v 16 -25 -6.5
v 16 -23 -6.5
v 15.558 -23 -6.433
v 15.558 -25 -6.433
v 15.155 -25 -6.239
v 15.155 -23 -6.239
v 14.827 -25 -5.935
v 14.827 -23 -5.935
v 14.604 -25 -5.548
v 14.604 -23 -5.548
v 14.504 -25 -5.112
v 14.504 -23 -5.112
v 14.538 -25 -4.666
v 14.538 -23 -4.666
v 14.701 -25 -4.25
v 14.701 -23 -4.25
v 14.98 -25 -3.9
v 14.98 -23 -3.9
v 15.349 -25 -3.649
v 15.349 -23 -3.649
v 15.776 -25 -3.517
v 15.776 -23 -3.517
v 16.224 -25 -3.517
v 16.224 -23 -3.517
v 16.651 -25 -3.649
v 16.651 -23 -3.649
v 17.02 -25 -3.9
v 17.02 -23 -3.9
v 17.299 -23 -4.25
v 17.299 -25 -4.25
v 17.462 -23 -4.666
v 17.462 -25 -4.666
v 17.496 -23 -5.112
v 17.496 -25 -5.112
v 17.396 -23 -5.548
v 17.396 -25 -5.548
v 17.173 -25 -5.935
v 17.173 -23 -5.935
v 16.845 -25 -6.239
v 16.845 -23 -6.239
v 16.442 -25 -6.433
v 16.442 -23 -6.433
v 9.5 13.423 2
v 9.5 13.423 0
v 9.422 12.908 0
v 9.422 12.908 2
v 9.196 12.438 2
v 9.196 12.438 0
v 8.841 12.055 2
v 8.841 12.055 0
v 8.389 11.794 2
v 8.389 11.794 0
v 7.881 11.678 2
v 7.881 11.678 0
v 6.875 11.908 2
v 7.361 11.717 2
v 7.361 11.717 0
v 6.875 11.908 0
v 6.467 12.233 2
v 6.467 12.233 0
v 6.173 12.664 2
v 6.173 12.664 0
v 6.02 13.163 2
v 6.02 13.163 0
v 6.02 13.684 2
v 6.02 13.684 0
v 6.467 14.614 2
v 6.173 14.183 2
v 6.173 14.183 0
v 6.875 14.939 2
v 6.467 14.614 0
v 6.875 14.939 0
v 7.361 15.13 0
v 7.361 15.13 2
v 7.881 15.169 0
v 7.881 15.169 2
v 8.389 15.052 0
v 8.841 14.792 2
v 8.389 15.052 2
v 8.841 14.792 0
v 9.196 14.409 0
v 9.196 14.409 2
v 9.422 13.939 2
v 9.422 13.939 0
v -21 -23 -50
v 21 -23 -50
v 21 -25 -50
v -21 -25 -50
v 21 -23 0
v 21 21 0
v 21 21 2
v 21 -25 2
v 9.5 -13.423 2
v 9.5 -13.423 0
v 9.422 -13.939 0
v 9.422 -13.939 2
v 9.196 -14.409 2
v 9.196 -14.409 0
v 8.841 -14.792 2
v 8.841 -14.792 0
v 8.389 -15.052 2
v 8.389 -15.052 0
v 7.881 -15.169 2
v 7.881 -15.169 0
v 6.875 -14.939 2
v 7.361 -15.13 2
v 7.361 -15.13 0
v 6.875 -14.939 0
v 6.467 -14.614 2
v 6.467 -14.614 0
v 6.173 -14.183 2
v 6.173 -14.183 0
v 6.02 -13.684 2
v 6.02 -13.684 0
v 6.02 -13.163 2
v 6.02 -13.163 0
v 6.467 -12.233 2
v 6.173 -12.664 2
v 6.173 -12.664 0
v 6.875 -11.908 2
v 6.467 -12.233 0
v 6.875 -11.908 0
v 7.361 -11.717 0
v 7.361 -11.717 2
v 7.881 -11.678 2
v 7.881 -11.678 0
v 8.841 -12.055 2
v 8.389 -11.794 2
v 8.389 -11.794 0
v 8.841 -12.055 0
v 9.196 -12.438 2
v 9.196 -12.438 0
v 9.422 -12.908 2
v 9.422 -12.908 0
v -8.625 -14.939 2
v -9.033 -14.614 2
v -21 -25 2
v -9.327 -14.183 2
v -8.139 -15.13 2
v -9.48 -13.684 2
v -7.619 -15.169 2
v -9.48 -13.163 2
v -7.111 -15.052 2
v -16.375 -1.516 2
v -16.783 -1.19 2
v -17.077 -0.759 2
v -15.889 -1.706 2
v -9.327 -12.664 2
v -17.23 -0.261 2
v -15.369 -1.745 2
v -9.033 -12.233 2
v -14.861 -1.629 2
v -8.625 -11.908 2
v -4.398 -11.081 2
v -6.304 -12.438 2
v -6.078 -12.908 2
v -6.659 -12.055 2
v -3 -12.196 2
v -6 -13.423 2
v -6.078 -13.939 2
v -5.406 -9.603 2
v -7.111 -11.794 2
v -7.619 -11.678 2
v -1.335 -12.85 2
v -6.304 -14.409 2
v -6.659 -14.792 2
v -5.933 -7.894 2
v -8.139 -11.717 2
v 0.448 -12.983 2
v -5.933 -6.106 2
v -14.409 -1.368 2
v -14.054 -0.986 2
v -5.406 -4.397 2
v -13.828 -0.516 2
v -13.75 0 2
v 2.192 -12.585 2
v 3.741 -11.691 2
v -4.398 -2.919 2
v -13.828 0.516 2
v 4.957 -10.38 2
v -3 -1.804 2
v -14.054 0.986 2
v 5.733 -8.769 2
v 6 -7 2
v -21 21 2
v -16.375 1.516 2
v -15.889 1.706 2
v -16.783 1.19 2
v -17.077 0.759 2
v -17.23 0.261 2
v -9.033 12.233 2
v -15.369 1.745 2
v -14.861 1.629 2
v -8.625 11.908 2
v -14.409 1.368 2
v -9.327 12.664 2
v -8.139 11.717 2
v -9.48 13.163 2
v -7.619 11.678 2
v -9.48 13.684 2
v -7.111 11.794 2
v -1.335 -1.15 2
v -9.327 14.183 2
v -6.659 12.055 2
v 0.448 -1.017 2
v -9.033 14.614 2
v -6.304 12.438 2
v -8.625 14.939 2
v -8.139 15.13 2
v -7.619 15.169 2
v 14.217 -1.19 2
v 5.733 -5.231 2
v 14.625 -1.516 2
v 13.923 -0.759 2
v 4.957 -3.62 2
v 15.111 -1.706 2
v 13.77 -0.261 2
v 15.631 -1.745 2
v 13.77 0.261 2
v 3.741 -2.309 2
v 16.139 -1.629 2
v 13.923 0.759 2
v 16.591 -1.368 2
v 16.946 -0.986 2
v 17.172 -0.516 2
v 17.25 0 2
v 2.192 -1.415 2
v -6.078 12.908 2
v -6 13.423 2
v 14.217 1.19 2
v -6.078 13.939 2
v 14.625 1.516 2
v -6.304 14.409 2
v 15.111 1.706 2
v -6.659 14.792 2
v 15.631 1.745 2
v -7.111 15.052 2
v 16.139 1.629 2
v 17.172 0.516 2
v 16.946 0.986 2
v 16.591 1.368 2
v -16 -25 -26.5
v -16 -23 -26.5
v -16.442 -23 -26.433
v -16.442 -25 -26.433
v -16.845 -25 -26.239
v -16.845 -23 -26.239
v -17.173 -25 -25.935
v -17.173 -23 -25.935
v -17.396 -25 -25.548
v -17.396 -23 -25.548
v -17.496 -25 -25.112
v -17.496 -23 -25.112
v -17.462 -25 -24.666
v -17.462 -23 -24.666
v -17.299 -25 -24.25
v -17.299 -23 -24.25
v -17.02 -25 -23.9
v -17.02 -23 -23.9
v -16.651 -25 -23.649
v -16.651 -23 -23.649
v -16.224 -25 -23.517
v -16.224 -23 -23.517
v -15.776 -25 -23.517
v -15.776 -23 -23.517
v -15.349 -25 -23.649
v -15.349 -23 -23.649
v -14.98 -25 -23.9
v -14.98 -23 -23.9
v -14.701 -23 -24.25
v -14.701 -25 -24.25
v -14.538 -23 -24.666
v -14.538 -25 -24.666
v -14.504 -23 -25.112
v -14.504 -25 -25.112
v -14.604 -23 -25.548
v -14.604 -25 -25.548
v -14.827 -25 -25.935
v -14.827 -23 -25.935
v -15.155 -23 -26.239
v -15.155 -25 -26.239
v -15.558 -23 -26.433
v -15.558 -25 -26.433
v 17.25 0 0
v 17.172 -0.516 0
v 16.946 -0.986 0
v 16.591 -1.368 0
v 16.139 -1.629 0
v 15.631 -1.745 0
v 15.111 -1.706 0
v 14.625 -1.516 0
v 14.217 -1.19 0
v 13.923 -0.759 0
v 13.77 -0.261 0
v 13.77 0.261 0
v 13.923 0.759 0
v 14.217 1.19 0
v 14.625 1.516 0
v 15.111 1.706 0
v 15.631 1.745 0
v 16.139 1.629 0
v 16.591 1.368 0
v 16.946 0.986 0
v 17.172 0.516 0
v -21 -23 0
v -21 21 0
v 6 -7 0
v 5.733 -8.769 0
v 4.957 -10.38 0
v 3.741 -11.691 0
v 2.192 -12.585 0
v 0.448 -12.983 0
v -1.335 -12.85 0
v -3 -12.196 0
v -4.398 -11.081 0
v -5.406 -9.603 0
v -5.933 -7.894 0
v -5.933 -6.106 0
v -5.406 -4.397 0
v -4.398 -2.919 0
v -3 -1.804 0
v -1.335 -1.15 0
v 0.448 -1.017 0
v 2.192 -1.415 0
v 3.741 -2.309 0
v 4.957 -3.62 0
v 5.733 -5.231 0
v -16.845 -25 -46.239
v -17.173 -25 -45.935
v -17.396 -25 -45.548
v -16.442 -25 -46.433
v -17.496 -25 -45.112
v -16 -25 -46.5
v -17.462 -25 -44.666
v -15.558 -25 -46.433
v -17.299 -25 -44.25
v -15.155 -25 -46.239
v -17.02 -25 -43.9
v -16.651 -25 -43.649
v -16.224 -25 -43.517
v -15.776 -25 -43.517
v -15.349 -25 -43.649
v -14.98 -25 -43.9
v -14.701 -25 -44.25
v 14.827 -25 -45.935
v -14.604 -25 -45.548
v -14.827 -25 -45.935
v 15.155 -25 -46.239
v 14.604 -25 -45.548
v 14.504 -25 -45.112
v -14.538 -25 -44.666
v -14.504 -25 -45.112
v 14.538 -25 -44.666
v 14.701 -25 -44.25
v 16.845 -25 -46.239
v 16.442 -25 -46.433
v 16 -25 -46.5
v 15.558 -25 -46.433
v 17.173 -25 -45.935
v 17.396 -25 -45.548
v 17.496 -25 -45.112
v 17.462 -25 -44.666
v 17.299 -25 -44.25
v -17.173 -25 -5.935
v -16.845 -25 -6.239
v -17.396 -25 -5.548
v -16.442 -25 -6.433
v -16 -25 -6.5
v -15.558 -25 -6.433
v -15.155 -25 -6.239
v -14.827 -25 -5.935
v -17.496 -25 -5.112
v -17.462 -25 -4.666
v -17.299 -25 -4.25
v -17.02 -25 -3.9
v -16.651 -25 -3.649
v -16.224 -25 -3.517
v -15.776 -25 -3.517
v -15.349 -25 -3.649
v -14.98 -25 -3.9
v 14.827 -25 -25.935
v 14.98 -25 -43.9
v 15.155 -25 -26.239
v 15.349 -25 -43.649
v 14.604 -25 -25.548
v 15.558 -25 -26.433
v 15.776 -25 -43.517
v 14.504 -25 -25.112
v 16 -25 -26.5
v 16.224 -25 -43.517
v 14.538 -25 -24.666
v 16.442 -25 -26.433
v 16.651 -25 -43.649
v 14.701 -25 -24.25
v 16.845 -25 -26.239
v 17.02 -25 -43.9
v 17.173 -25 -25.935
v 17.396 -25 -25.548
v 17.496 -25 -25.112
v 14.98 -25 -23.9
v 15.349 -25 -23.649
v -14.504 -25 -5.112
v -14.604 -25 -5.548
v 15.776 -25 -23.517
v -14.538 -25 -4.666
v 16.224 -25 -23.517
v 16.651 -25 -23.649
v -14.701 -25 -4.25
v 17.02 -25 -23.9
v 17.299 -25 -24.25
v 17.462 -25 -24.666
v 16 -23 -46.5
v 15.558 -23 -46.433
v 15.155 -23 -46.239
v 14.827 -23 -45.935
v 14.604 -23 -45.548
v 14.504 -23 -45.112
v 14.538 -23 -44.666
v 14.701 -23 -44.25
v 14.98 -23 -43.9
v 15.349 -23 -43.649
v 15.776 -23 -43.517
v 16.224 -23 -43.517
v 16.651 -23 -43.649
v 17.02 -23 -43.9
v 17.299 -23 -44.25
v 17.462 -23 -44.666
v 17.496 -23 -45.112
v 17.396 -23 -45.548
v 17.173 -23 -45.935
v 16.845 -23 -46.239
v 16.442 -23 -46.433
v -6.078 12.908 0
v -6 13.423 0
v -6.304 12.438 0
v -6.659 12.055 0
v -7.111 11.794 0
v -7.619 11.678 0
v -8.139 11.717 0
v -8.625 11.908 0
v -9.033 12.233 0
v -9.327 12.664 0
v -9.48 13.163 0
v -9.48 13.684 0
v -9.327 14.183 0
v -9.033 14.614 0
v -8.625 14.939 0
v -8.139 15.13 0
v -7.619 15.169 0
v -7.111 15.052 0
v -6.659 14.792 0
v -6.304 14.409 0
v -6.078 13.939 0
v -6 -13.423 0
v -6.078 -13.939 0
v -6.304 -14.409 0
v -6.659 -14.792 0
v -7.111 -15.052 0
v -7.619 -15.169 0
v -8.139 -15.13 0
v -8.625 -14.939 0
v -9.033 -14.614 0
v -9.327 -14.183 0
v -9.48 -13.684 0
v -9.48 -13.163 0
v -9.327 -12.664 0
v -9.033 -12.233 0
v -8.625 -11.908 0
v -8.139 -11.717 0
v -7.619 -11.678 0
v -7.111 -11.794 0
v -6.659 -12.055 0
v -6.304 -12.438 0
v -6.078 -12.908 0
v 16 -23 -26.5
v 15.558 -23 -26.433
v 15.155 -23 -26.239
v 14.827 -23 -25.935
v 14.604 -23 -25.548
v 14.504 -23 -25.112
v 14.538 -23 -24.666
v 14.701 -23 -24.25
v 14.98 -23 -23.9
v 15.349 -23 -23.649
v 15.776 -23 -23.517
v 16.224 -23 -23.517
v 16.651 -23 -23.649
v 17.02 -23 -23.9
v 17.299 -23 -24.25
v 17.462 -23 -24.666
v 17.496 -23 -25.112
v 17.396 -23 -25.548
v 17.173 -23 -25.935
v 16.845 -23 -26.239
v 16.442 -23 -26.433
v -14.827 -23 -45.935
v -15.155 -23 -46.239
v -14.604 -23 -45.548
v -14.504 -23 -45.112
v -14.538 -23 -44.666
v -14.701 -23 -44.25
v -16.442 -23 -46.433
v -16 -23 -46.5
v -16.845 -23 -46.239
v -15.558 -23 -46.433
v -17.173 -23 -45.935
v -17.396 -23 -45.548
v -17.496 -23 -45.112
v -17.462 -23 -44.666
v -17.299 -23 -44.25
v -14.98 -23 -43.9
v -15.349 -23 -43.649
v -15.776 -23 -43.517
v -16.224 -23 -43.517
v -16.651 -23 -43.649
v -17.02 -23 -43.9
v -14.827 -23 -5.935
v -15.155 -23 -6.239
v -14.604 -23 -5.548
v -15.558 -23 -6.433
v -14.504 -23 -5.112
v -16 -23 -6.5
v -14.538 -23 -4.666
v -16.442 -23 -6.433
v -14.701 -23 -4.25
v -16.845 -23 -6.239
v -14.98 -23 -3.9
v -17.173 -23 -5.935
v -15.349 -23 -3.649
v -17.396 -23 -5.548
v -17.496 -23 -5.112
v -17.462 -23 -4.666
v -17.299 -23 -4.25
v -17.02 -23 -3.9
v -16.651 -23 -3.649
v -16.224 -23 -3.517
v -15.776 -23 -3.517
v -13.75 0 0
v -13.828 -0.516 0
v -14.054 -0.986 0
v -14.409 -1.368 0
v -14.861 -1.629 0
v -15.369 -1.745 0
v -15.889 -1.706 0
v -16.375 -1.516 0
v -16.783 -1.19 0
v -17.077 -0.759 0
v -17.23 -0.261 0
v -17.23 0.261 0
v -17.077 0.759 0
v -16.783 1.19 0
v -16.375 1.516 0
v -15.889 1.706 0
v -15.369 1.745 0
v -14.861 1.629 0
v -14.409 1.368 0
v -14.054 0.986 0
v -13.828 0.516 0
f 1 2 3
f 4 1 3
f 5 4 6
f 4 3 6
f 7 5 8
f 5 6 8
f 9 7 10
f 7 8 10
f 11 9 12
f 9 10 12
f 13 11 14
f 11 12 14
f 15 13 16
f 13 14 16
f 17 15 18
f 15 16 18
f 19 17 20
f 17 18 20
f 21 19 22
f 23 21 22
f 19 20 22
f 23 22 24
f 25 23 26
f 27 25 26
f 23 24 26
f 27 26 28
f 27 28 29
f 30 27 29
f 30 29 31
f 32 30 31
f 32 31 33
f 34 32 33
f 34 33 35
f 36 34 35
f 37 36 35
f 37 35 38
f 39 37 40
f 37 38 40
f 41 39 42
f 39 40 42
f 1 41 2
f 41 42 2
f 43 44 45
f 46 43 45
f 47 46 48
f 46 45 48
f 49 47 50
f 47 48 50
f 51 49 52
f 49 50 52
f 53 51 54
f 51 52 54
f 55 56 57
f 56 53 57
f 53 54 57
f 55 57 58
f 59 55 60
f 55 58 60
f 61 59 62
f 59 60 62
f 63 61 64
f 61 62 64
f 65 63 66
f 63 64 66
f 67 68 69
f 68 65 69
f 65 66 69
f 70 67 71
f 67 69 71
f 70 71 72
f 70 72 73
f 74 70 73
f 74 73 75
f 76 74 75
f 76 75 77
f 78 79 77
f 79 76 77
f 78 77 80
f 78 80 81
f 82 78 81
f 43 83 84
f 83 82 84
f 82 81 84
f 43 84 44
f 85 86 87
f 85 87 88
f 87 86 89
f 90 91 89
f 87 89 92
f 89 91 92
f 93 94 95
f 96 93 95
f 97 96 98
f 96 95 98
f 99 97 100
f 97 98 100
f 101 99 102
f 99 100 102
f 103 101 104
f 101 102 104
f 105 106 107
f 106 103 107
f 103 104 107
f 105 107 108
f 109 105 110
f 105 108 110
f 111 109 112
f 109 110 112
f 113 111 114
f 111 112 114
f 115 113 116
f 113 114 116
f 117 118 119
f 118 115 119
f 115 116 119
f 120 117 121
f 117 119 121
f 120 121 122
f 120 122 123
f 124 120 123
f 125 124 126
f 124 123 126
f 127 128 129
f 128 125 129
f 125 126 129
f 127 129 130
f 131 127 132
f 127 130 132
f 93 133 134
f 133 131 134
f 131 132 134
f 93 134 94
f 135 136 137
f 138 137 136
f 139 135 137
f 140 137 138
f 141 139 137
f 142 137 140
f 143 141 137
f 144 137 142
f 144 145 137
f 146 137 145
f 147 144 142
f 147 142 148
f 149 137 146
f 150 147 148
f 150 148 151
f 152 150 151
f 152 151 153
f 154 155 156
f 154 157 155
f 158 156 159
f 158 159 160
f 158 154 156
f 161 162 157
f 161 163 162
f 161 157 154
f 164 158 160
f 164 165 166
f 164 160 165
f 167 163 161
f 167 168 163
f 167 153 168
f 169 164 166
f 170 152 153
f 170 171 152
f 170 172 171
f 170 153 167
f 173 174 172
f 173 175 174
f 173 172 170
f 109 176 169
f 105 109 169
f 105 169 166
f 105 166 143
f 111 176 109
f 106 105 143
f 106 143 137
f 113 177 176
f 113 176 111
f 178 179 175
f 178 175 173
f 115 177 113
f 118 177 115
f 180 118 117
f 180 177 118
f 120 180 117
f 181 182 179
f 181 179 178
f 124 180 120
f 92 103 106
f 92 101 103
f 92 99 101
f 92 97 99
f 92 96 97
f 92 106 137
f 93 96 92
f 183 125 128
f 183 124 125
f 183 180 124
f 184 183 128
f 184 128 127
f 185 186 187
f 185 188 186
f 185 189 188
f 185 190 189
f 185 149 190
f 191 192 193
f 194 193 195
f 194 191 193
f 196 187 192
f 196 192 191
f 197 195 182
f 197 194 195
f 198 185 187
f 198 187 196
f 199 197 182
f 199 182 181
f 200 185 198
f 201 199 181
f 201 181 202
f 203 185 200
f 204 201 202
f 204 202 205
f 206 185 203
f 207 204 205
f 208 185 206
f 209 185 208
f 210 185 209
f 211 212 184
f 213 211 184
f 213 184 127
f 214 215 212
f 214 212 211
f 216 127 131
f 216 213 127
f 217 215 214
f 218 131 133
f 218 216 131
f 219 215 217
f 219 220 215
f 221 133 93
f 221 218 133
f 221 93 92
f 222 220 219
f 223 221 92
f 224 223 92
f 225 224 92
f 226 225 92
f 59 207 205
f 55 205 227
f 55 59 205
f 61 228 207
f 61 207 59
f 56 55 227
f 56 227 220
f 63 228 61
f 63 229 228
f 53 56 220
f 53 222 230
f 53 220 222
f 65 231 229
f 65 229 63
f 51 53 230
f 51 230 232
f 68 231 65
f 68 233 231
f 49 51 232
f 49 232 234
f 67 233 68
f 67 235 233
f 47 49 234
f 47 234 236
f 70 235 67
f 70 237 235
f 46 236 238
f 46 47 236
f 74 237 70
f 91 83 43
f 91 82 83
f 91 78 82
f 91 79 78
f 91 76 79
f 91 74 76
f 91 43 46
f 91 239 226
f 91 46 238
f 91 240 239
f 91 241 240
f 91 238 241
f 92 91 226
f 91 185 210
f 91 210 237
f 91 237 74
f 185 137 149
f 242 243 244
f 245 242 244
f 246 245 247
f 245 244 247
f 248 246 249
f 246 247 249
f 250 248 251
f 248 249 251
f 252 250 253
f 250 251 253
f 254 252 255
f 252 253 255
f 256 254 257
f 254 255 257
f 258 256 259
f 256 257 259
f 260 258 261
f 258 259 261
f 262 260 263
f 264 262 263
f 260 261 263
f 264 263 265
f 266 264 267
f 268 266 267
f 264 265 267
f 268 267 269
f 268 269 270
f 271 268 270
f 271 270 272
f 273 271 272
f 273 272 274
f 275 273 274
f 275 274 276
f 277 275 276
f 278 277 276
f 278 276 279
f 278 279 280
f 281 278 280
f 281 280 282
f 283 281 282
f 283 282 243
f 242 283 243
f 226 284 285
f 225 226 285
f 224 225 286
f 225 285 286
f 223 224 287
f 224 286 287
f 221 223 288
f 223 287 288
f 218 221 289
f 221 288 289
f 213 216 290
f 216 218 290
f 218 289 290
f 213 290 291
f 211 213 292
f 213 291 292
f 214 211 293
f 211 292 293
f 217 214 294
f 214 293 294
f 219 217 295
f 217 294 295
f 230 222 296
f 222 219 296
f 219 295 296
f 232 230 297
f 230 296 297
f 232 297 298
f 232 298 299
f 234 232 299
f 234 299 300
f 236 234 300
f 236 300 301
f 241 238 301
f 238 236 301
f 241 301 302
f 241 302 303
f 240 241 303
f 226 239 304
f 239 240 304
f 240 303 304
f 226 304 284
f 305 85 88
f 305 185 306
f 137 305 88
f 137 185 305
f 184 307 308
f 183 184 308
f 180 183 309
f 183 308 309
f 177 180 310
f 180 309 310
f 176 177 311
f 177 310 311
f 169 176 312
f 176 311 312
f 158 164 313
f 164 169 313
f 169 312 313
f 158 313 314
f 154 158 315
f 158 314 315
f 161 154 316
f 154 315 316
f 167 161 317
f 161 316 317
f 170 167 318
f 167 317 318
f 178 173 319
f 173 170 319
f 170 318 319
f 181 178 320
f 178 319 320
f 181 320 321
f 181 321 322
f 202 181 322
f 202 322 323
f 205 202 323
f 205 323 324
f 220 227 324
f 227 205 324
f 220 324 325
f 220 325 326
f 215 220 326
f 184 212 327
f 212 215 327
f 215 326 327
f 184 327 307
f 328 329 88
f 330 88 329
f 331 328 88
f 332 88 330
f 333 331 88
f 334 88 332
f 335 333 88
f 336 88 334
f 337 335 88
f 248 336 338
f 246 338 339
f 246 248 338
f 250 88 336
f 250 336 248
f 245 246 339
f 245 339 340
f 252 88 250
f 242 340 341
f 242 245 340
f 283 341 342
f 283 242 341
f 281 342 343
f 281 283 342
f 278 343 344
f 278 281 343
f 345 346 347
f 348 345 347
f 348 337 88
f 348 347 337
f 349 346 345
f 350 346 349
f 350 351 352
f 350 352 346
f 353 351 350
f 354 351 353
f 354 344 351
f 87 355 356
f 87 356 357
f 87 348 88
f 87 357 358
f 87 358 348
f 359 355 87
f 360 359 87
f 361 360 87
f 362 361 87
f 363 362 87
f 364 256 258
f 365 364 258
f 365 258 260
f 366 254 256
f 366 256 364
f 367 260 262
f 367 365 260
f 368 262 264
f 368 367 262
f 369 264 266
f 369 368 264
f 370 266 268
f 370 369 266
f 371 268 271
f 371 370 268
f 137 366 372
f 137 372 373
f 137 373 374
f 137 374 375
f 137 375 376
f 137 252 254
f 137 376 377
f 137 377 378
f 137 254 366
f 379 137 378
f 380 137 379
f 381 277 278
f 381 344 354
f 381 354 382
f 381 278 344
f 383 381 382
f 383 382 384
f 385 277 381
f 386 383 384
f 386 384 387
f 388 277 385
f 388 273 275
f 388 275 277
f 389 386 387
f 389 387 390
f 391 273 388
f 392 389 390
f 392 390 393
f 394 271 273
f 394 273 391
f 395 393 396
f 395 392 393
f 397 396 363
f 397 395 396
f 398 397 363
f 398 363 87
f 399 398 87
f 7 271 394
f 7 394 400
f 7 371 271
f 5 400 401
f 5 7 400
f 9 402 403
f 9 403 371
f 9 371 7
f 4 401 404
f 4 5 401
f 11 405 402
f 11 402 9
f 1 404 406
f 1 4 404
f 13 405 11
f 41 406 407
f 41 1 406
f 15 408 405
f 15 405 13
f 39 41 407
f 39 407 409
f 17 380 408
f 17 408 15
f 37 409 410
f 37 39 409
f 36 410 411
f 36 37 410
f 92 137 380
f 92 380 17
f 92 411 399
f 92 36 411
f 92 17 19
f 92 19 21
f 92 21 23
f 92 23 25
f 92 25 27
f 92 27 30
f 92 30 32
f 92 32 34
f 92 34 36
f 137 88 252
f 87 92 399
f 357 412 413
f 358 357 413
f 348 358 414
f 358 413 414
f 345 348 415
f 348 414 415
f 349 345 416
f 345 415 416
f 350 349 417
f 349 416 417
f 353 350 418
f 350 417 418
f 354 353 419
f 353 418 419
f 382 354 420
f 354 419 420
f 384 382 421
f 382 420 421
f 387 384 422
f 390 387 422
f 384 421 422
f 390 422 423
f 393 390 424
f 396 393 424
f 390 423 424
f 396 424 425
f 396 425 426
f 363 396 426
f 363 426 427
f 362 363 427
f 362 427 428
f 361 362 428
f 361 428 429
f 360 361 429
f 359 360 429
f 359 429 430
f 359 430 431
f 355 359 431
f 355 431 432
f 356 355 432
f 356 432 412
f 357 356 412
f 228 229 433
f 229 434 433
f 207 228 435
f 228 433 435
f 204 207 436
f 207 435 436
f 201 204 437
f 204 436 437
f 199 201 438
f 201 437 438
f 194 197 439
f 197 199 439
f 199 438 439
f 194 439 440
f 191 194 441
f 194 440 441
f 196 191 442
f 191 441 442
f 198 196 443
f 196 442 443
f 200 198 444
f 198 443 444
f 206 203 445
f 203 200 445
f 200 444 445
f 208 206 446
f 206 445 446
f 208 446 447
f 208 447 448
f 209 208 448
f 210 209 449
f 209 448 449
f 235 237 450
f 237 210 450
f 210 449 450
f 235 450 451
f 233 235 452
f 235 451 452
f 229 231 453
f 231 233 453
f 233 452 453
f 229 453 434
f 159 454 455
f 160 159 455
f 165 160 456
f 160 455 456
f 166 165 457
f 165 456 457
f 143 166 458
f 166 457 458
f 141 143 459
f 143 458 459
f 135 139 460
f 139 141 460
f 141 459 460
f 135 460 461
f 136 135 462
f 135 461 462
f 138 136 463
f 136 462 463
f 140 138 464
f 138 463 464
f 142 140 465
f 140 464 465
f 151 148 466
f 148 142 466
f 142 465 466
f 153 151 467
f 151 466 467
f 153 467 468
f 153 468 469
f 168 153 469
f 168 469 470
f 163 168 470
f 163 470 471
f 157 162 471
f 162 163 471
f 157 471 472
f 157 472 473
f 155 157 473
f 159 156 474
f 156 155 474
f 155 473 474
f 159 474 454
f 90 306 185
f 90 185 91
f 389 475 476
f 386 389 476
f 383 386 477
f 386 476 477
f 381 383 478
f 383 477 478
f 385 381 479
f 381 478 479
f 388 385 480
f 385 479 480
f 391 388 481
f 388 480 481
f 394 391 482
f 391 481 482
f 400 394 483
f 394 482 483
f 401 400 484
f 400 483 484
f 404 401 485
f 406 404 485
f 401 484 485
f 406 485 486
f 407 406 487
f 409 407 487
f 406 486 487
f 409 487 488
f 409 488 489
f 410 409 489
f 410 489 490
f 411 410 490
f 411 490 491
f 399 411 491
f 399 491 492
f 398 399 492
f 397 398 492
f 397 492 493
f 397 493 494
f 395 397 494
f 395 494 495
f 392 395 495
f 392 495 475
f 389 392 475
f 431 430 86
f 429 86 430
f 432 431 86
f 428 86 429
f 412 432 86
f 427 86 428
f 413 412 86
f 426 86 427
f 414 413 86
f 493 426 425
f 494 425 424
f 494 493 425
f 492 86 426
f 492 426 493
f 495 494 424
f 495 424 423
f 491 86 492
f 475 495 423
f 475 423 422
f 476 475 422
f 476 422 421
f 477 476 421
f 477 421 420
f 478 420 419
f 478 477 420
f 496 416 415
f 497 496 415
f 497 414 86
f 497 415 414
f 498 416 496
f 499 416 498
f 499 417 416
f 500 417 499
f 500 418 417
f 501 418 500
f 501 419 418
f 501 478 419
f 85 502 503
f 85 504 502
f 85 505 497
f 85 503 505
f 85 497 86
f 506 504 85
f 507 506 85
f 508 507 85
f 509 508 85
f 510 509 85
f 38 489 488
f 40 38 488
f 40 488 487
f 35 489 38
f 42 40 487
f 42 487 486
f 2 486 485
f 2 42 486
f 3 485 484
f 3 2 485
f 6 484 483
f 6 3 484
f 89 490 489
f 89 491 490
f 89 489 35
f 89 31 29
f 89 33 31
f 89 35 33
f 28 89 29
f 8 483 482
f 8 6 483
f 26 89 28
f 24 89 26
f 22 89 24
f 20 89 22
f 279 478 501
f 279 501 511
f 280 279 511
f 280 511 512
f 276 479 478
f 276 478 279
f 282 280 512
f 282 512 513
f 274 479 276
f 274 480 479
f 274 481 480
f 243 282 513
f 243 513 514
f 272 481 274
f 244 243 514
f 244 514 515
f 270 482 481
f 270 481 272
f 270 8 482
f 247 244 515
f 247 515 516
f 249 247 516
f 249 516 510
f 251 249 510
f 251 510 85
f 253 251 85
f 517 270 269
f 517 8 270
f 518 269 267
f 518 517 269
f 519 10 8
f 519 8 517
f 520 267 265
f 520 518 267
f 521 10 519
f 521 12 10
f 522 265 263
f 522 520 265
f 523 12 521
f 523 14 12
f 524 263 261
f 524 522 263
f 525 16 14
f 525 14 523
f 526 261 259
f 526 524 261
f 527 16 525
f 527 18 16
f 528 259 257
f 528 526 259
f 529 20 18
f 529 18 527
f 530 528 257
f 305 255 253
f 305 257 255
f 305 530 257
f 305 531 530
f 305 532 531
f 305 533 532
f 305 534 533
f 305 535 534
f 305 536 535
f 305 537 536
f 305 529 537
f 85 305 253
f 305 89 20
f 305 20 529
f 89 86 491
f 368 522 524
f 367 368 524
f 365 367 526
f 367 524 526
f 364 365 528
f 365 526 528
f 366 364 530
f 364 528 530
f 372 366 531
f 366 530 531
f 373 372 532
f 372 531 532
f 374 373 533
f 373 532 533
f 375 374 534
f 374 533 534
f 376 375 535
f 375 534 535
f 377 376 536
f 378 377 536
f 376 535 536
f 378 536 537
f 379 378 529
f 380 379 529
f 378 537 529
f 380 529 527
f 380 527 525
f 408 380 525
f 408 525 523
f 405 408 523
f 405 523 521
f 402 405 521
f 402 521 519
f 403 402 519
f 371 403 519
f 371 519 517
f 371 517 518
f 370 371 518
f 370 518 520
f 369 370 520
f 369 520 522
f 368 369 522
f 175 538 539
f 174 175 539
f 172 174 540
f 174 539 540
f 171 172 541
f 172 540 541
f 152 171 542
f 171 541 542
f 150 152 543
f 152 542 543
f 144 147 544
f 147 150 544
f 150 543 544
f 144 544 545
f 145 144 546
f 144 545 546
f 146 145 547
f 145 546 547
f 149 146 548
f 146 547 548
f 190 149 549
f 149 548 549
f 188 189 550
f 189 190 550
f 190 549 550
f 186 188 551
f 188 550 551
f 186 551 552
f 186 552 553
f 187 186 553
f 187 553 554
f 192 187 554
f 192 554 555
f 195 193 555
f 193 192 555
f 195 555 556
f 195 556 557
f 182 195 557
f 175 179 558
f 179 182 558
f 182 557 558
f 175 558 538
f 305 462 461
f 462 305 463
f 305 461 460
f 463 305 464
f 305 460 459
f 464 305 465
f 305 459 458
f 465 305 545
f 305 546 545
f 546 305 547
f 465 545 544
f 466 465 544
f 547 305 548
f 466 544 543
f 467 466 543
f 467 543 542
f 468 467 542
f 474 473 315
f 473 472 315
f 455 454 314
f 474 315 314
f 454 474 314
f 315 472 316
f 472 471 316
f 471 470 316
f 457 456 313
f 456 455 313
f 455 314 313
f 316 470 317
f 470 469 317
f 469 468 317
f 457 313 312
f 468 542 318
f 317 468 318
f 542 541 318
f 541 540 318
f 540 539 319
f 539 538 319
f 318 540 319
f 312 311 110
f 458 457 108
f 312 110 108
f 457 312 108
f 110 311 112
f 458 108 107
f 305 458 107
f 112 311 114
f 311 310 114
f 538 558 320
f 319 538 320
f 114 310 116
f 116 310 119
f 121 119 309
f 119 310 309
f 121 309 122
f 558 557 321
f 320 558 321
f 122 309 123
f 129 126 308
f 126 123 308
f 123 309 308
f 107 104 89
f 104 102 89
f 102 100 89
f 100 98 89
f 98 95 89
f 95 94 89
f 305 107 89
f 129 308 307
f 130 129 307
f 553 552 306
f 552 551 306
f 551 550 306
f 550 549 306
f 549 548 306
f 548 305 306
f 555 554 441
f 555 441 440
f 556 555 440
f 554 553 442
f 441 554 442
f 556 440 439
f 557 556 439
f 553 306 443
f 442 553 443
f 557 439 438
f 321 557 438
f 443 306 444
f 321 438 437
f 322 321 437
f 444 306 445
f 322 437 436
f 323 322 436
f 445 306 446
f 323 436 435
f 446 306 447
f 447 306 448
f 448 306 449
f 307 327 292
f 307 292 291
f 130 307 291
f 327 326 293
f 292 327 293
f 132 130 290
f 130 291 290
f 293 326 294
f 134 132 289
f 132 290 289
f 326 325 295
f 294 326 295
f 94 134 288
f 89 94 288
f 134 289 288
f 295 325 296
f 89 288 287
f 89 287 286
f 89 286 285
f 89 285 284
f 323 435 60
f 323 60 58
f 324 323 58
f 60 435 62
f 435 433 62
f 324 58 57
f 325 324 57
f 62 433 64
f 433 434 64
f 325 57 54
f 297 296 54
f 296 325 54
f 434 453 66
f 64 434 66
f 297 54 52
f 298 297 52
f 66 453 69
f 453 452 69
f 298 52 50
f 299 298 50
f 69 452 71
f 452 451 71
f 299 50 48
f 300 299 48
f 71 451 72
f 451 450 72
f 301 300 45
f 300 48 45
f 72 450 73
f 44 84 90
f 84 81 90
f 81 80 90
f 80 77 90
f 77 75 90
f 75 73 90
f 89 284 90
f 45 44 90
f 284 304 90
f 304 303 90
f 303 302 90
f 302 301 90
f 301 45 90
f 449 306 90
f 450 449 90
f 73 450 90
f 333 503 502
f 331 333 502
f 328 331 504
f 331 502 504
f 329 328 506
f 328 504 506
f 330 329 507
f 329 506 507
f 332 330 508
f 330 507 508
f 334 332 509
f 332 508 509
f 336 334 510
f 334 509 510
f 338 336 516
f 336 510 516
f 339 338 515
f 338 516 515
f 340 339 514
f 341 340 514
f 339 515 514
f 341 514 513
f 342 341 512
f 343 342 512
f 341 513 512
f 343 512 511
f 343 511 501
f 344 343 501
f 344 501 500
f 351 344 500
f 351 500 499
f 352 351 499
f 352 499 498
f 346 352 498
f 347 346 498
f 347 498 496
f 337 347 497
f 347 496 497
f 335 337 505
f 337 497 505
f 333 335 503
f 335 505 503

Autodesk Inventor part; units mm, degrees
ref_plane "YZ Plane" through (0, 0, 0) normal (1, 0, 0) x (0, 1, 0)
ref_plane "XZ Plane" through (0, 0, 0) normal (0, 1, 0) x (-1, 0, 0)
ref_plane "XY Plane" through (0, 0, 0) normal (0, 0, 1) x (1, 0, 0)
sketch "Esquisse1" plane through (0, 0, 0) normal (0, 0, 1) x (1, 0, 0)
  circle A0 centre (0, 0) radius 18.4
  circle A1 centre (0, -7) radius 6
  circle A2 centre (15.5, 0) radius 1.25
  circle A3 centre (7.75, -13.4234) radius 1.25
  circle A4 centre (-7.75, -13.4234) radius 1.25
  circle A5 centre (-15.5, 0) radius 1.25
  circle A6 centre (-7.75, 13.4234) radius 1.25
  circle A7 centre (7.75, 13.4234) radius 1.25
  circle A8 centre (0, 15.5) radius 1.9
  circle A9 centre (-13.4234, -7.75) radius 1.9
  circle A10 centre (13.4234, -7.75) radius 1.9
  arc A11 (9.2253, -8.2857) -> (-9.2253, -8.2857) centre (0, 0) ccw
  spline S0 degree 3 poles (9.2254, -8.2857) (9.1718, -8.3454) (9.1113, -8.4012) (8.9929, -8.4831) (8.9346, -8.5143) (8.8333, -8.5456) (8.791, -8.5527) (8.7144, -8.5502) (8.6808, -8.5434) (8.6178, -8.5166) (8.59, -8.4975) (8.5381, -8.4462) (8.5162, -8.4136) (8.4741, -8.3274) (8.4589, -8.2705) (8.4364, -8.1241) (8.4381, -8.0284) (8.4482, -7.9376) knots -0.133179 -0.133179 -0.133179 -0.133179 -0.109147 -0.109147 -0.089905 -0.089905 -0.077133 -0.077133 -0.066705 -0.066705 -0.05641 -0.05641 -0.044636 -0.044636 -0.027428 -0.027428 0 0 0 0
  arc A12 (8.4481, -7.9376) -> (-8.4481, -7.9376) centre (0, -7) ccw
  spline S1 degree 3 poles (-8.4482, -7.9376) (-8.4382, -8.0273) (-8.4365, -8.1217) (-8.4582, -8.2676) (-8.4733, -8.3251) (-8.5152, -8.412) (-8.537, -8.4449) (-8.5887, -8.4966) (-8.6164, -8.5158) (-8.6792, -8.543) (-8.7127, -8.5499) (-8.7891, -8.5529) (-8.8312, -8.546) (-8.932, -8.5155) (-8.99, -8.4848) (-9.1093, -8.403) (-9.1709, -8.3463) (-9.2254, -8.2857) knots -0.133396 -0.133396 -0.133396 -0.133396 -0.106249 -0.106249 -0.088887 -0.088887 -0.077046 -0.077046 -0.066737 -0.066737 -0.056304 -0.056304 -0.043575 -0.043575 -0.024448 -0.024448 0 0 0 0
  line L0 (-21, 21) -> (21, 21)
  line L1 (21, 21) -> (21, -25)
  line L2 (21, -25) -> (-21, -25)
  line L3 (-21, -25) -> (-21, 21)
  circle A13 centre (-7.75, 13.4234) radius 1.75
  circle A14 centre (-15.5, 0) radius 1.75
  circle A15 centre (7.75, 13.4234) radius 1.75
  circle A16 centre (15.5, 0) radius 1.75
  circle A17 centre (-7.75, -13.4234) radius 1.75
  circle A18 centre (7.75, -13.4234) radius 1.75
  circle A19 centre (-7.75, 13.4234) radius 1.75
  circle A20 centre (7.75, 13.4234) radius 1.75
  circle A21 centre (15.5, 0) radius 1.75
  circle A22 centre (7.75, -13.4234) radius 1.75
  circle A23 centre (-7.75, -13.4234) radius 1.75
  circle A24 centre (-15.5, 0) radius 1.75
  circle A25 centre (0, -7) radius 6
extrude "Extrusion1" add sketch "Esquisse1" along normal blind 2 contours A0 | A8 | A9 | A10 | S0 A12 S1 A11 | L0 L1 L2 L3
sketch "Esquisse2" plane through (0, 0, 0) normal (0, 0, -1) x (-1, 0, 0)
  line L0 (-21, 21) -> (-21, -25) projected
  line L1 (21, -25) -> (-21, -25)
  line L2 (-21, -25) -> (-21, -23)
  line L3 (-21, -23) -> (21, -23)
  line L4 (21, -23) -> (21, -25)
  point P0 (0, 0)
  dimension "d7" = 2
extrude "Extrusion2" add sketch "Esquisse2" along normal blind 50
sketch "Esquisse3" plane through (-21, -25, 2) normal (0, -1, 0) x (1, 0, 0)
  line L0 (0, 0) -> (0, -52) projected
  line L1 (42, -52) -> (0, -52) projected
  point P0 (21, -2)
  point P1 (5, -47)
  point P2 (5, -27)
  point P3 (5, -7)
  point P4 (37, -47)
  point P5 (37, -27)
  point P6 (37, -7)
  dimension "d10" = 5
  dimension "d11" = 5
  dimension "d12" = 52
  dimension "d15" = 20
  dimension "d18" = 32
hole "Perçage1" at (-16, -25, -45) at (-16, -25, -25) at (-16, -25, -5) at (16, -25, -45) at (16, -25, -25) at (16, -25, -5) direction (0, 1, 0) diameter 3 end through all
properties part number "support_moteur"
